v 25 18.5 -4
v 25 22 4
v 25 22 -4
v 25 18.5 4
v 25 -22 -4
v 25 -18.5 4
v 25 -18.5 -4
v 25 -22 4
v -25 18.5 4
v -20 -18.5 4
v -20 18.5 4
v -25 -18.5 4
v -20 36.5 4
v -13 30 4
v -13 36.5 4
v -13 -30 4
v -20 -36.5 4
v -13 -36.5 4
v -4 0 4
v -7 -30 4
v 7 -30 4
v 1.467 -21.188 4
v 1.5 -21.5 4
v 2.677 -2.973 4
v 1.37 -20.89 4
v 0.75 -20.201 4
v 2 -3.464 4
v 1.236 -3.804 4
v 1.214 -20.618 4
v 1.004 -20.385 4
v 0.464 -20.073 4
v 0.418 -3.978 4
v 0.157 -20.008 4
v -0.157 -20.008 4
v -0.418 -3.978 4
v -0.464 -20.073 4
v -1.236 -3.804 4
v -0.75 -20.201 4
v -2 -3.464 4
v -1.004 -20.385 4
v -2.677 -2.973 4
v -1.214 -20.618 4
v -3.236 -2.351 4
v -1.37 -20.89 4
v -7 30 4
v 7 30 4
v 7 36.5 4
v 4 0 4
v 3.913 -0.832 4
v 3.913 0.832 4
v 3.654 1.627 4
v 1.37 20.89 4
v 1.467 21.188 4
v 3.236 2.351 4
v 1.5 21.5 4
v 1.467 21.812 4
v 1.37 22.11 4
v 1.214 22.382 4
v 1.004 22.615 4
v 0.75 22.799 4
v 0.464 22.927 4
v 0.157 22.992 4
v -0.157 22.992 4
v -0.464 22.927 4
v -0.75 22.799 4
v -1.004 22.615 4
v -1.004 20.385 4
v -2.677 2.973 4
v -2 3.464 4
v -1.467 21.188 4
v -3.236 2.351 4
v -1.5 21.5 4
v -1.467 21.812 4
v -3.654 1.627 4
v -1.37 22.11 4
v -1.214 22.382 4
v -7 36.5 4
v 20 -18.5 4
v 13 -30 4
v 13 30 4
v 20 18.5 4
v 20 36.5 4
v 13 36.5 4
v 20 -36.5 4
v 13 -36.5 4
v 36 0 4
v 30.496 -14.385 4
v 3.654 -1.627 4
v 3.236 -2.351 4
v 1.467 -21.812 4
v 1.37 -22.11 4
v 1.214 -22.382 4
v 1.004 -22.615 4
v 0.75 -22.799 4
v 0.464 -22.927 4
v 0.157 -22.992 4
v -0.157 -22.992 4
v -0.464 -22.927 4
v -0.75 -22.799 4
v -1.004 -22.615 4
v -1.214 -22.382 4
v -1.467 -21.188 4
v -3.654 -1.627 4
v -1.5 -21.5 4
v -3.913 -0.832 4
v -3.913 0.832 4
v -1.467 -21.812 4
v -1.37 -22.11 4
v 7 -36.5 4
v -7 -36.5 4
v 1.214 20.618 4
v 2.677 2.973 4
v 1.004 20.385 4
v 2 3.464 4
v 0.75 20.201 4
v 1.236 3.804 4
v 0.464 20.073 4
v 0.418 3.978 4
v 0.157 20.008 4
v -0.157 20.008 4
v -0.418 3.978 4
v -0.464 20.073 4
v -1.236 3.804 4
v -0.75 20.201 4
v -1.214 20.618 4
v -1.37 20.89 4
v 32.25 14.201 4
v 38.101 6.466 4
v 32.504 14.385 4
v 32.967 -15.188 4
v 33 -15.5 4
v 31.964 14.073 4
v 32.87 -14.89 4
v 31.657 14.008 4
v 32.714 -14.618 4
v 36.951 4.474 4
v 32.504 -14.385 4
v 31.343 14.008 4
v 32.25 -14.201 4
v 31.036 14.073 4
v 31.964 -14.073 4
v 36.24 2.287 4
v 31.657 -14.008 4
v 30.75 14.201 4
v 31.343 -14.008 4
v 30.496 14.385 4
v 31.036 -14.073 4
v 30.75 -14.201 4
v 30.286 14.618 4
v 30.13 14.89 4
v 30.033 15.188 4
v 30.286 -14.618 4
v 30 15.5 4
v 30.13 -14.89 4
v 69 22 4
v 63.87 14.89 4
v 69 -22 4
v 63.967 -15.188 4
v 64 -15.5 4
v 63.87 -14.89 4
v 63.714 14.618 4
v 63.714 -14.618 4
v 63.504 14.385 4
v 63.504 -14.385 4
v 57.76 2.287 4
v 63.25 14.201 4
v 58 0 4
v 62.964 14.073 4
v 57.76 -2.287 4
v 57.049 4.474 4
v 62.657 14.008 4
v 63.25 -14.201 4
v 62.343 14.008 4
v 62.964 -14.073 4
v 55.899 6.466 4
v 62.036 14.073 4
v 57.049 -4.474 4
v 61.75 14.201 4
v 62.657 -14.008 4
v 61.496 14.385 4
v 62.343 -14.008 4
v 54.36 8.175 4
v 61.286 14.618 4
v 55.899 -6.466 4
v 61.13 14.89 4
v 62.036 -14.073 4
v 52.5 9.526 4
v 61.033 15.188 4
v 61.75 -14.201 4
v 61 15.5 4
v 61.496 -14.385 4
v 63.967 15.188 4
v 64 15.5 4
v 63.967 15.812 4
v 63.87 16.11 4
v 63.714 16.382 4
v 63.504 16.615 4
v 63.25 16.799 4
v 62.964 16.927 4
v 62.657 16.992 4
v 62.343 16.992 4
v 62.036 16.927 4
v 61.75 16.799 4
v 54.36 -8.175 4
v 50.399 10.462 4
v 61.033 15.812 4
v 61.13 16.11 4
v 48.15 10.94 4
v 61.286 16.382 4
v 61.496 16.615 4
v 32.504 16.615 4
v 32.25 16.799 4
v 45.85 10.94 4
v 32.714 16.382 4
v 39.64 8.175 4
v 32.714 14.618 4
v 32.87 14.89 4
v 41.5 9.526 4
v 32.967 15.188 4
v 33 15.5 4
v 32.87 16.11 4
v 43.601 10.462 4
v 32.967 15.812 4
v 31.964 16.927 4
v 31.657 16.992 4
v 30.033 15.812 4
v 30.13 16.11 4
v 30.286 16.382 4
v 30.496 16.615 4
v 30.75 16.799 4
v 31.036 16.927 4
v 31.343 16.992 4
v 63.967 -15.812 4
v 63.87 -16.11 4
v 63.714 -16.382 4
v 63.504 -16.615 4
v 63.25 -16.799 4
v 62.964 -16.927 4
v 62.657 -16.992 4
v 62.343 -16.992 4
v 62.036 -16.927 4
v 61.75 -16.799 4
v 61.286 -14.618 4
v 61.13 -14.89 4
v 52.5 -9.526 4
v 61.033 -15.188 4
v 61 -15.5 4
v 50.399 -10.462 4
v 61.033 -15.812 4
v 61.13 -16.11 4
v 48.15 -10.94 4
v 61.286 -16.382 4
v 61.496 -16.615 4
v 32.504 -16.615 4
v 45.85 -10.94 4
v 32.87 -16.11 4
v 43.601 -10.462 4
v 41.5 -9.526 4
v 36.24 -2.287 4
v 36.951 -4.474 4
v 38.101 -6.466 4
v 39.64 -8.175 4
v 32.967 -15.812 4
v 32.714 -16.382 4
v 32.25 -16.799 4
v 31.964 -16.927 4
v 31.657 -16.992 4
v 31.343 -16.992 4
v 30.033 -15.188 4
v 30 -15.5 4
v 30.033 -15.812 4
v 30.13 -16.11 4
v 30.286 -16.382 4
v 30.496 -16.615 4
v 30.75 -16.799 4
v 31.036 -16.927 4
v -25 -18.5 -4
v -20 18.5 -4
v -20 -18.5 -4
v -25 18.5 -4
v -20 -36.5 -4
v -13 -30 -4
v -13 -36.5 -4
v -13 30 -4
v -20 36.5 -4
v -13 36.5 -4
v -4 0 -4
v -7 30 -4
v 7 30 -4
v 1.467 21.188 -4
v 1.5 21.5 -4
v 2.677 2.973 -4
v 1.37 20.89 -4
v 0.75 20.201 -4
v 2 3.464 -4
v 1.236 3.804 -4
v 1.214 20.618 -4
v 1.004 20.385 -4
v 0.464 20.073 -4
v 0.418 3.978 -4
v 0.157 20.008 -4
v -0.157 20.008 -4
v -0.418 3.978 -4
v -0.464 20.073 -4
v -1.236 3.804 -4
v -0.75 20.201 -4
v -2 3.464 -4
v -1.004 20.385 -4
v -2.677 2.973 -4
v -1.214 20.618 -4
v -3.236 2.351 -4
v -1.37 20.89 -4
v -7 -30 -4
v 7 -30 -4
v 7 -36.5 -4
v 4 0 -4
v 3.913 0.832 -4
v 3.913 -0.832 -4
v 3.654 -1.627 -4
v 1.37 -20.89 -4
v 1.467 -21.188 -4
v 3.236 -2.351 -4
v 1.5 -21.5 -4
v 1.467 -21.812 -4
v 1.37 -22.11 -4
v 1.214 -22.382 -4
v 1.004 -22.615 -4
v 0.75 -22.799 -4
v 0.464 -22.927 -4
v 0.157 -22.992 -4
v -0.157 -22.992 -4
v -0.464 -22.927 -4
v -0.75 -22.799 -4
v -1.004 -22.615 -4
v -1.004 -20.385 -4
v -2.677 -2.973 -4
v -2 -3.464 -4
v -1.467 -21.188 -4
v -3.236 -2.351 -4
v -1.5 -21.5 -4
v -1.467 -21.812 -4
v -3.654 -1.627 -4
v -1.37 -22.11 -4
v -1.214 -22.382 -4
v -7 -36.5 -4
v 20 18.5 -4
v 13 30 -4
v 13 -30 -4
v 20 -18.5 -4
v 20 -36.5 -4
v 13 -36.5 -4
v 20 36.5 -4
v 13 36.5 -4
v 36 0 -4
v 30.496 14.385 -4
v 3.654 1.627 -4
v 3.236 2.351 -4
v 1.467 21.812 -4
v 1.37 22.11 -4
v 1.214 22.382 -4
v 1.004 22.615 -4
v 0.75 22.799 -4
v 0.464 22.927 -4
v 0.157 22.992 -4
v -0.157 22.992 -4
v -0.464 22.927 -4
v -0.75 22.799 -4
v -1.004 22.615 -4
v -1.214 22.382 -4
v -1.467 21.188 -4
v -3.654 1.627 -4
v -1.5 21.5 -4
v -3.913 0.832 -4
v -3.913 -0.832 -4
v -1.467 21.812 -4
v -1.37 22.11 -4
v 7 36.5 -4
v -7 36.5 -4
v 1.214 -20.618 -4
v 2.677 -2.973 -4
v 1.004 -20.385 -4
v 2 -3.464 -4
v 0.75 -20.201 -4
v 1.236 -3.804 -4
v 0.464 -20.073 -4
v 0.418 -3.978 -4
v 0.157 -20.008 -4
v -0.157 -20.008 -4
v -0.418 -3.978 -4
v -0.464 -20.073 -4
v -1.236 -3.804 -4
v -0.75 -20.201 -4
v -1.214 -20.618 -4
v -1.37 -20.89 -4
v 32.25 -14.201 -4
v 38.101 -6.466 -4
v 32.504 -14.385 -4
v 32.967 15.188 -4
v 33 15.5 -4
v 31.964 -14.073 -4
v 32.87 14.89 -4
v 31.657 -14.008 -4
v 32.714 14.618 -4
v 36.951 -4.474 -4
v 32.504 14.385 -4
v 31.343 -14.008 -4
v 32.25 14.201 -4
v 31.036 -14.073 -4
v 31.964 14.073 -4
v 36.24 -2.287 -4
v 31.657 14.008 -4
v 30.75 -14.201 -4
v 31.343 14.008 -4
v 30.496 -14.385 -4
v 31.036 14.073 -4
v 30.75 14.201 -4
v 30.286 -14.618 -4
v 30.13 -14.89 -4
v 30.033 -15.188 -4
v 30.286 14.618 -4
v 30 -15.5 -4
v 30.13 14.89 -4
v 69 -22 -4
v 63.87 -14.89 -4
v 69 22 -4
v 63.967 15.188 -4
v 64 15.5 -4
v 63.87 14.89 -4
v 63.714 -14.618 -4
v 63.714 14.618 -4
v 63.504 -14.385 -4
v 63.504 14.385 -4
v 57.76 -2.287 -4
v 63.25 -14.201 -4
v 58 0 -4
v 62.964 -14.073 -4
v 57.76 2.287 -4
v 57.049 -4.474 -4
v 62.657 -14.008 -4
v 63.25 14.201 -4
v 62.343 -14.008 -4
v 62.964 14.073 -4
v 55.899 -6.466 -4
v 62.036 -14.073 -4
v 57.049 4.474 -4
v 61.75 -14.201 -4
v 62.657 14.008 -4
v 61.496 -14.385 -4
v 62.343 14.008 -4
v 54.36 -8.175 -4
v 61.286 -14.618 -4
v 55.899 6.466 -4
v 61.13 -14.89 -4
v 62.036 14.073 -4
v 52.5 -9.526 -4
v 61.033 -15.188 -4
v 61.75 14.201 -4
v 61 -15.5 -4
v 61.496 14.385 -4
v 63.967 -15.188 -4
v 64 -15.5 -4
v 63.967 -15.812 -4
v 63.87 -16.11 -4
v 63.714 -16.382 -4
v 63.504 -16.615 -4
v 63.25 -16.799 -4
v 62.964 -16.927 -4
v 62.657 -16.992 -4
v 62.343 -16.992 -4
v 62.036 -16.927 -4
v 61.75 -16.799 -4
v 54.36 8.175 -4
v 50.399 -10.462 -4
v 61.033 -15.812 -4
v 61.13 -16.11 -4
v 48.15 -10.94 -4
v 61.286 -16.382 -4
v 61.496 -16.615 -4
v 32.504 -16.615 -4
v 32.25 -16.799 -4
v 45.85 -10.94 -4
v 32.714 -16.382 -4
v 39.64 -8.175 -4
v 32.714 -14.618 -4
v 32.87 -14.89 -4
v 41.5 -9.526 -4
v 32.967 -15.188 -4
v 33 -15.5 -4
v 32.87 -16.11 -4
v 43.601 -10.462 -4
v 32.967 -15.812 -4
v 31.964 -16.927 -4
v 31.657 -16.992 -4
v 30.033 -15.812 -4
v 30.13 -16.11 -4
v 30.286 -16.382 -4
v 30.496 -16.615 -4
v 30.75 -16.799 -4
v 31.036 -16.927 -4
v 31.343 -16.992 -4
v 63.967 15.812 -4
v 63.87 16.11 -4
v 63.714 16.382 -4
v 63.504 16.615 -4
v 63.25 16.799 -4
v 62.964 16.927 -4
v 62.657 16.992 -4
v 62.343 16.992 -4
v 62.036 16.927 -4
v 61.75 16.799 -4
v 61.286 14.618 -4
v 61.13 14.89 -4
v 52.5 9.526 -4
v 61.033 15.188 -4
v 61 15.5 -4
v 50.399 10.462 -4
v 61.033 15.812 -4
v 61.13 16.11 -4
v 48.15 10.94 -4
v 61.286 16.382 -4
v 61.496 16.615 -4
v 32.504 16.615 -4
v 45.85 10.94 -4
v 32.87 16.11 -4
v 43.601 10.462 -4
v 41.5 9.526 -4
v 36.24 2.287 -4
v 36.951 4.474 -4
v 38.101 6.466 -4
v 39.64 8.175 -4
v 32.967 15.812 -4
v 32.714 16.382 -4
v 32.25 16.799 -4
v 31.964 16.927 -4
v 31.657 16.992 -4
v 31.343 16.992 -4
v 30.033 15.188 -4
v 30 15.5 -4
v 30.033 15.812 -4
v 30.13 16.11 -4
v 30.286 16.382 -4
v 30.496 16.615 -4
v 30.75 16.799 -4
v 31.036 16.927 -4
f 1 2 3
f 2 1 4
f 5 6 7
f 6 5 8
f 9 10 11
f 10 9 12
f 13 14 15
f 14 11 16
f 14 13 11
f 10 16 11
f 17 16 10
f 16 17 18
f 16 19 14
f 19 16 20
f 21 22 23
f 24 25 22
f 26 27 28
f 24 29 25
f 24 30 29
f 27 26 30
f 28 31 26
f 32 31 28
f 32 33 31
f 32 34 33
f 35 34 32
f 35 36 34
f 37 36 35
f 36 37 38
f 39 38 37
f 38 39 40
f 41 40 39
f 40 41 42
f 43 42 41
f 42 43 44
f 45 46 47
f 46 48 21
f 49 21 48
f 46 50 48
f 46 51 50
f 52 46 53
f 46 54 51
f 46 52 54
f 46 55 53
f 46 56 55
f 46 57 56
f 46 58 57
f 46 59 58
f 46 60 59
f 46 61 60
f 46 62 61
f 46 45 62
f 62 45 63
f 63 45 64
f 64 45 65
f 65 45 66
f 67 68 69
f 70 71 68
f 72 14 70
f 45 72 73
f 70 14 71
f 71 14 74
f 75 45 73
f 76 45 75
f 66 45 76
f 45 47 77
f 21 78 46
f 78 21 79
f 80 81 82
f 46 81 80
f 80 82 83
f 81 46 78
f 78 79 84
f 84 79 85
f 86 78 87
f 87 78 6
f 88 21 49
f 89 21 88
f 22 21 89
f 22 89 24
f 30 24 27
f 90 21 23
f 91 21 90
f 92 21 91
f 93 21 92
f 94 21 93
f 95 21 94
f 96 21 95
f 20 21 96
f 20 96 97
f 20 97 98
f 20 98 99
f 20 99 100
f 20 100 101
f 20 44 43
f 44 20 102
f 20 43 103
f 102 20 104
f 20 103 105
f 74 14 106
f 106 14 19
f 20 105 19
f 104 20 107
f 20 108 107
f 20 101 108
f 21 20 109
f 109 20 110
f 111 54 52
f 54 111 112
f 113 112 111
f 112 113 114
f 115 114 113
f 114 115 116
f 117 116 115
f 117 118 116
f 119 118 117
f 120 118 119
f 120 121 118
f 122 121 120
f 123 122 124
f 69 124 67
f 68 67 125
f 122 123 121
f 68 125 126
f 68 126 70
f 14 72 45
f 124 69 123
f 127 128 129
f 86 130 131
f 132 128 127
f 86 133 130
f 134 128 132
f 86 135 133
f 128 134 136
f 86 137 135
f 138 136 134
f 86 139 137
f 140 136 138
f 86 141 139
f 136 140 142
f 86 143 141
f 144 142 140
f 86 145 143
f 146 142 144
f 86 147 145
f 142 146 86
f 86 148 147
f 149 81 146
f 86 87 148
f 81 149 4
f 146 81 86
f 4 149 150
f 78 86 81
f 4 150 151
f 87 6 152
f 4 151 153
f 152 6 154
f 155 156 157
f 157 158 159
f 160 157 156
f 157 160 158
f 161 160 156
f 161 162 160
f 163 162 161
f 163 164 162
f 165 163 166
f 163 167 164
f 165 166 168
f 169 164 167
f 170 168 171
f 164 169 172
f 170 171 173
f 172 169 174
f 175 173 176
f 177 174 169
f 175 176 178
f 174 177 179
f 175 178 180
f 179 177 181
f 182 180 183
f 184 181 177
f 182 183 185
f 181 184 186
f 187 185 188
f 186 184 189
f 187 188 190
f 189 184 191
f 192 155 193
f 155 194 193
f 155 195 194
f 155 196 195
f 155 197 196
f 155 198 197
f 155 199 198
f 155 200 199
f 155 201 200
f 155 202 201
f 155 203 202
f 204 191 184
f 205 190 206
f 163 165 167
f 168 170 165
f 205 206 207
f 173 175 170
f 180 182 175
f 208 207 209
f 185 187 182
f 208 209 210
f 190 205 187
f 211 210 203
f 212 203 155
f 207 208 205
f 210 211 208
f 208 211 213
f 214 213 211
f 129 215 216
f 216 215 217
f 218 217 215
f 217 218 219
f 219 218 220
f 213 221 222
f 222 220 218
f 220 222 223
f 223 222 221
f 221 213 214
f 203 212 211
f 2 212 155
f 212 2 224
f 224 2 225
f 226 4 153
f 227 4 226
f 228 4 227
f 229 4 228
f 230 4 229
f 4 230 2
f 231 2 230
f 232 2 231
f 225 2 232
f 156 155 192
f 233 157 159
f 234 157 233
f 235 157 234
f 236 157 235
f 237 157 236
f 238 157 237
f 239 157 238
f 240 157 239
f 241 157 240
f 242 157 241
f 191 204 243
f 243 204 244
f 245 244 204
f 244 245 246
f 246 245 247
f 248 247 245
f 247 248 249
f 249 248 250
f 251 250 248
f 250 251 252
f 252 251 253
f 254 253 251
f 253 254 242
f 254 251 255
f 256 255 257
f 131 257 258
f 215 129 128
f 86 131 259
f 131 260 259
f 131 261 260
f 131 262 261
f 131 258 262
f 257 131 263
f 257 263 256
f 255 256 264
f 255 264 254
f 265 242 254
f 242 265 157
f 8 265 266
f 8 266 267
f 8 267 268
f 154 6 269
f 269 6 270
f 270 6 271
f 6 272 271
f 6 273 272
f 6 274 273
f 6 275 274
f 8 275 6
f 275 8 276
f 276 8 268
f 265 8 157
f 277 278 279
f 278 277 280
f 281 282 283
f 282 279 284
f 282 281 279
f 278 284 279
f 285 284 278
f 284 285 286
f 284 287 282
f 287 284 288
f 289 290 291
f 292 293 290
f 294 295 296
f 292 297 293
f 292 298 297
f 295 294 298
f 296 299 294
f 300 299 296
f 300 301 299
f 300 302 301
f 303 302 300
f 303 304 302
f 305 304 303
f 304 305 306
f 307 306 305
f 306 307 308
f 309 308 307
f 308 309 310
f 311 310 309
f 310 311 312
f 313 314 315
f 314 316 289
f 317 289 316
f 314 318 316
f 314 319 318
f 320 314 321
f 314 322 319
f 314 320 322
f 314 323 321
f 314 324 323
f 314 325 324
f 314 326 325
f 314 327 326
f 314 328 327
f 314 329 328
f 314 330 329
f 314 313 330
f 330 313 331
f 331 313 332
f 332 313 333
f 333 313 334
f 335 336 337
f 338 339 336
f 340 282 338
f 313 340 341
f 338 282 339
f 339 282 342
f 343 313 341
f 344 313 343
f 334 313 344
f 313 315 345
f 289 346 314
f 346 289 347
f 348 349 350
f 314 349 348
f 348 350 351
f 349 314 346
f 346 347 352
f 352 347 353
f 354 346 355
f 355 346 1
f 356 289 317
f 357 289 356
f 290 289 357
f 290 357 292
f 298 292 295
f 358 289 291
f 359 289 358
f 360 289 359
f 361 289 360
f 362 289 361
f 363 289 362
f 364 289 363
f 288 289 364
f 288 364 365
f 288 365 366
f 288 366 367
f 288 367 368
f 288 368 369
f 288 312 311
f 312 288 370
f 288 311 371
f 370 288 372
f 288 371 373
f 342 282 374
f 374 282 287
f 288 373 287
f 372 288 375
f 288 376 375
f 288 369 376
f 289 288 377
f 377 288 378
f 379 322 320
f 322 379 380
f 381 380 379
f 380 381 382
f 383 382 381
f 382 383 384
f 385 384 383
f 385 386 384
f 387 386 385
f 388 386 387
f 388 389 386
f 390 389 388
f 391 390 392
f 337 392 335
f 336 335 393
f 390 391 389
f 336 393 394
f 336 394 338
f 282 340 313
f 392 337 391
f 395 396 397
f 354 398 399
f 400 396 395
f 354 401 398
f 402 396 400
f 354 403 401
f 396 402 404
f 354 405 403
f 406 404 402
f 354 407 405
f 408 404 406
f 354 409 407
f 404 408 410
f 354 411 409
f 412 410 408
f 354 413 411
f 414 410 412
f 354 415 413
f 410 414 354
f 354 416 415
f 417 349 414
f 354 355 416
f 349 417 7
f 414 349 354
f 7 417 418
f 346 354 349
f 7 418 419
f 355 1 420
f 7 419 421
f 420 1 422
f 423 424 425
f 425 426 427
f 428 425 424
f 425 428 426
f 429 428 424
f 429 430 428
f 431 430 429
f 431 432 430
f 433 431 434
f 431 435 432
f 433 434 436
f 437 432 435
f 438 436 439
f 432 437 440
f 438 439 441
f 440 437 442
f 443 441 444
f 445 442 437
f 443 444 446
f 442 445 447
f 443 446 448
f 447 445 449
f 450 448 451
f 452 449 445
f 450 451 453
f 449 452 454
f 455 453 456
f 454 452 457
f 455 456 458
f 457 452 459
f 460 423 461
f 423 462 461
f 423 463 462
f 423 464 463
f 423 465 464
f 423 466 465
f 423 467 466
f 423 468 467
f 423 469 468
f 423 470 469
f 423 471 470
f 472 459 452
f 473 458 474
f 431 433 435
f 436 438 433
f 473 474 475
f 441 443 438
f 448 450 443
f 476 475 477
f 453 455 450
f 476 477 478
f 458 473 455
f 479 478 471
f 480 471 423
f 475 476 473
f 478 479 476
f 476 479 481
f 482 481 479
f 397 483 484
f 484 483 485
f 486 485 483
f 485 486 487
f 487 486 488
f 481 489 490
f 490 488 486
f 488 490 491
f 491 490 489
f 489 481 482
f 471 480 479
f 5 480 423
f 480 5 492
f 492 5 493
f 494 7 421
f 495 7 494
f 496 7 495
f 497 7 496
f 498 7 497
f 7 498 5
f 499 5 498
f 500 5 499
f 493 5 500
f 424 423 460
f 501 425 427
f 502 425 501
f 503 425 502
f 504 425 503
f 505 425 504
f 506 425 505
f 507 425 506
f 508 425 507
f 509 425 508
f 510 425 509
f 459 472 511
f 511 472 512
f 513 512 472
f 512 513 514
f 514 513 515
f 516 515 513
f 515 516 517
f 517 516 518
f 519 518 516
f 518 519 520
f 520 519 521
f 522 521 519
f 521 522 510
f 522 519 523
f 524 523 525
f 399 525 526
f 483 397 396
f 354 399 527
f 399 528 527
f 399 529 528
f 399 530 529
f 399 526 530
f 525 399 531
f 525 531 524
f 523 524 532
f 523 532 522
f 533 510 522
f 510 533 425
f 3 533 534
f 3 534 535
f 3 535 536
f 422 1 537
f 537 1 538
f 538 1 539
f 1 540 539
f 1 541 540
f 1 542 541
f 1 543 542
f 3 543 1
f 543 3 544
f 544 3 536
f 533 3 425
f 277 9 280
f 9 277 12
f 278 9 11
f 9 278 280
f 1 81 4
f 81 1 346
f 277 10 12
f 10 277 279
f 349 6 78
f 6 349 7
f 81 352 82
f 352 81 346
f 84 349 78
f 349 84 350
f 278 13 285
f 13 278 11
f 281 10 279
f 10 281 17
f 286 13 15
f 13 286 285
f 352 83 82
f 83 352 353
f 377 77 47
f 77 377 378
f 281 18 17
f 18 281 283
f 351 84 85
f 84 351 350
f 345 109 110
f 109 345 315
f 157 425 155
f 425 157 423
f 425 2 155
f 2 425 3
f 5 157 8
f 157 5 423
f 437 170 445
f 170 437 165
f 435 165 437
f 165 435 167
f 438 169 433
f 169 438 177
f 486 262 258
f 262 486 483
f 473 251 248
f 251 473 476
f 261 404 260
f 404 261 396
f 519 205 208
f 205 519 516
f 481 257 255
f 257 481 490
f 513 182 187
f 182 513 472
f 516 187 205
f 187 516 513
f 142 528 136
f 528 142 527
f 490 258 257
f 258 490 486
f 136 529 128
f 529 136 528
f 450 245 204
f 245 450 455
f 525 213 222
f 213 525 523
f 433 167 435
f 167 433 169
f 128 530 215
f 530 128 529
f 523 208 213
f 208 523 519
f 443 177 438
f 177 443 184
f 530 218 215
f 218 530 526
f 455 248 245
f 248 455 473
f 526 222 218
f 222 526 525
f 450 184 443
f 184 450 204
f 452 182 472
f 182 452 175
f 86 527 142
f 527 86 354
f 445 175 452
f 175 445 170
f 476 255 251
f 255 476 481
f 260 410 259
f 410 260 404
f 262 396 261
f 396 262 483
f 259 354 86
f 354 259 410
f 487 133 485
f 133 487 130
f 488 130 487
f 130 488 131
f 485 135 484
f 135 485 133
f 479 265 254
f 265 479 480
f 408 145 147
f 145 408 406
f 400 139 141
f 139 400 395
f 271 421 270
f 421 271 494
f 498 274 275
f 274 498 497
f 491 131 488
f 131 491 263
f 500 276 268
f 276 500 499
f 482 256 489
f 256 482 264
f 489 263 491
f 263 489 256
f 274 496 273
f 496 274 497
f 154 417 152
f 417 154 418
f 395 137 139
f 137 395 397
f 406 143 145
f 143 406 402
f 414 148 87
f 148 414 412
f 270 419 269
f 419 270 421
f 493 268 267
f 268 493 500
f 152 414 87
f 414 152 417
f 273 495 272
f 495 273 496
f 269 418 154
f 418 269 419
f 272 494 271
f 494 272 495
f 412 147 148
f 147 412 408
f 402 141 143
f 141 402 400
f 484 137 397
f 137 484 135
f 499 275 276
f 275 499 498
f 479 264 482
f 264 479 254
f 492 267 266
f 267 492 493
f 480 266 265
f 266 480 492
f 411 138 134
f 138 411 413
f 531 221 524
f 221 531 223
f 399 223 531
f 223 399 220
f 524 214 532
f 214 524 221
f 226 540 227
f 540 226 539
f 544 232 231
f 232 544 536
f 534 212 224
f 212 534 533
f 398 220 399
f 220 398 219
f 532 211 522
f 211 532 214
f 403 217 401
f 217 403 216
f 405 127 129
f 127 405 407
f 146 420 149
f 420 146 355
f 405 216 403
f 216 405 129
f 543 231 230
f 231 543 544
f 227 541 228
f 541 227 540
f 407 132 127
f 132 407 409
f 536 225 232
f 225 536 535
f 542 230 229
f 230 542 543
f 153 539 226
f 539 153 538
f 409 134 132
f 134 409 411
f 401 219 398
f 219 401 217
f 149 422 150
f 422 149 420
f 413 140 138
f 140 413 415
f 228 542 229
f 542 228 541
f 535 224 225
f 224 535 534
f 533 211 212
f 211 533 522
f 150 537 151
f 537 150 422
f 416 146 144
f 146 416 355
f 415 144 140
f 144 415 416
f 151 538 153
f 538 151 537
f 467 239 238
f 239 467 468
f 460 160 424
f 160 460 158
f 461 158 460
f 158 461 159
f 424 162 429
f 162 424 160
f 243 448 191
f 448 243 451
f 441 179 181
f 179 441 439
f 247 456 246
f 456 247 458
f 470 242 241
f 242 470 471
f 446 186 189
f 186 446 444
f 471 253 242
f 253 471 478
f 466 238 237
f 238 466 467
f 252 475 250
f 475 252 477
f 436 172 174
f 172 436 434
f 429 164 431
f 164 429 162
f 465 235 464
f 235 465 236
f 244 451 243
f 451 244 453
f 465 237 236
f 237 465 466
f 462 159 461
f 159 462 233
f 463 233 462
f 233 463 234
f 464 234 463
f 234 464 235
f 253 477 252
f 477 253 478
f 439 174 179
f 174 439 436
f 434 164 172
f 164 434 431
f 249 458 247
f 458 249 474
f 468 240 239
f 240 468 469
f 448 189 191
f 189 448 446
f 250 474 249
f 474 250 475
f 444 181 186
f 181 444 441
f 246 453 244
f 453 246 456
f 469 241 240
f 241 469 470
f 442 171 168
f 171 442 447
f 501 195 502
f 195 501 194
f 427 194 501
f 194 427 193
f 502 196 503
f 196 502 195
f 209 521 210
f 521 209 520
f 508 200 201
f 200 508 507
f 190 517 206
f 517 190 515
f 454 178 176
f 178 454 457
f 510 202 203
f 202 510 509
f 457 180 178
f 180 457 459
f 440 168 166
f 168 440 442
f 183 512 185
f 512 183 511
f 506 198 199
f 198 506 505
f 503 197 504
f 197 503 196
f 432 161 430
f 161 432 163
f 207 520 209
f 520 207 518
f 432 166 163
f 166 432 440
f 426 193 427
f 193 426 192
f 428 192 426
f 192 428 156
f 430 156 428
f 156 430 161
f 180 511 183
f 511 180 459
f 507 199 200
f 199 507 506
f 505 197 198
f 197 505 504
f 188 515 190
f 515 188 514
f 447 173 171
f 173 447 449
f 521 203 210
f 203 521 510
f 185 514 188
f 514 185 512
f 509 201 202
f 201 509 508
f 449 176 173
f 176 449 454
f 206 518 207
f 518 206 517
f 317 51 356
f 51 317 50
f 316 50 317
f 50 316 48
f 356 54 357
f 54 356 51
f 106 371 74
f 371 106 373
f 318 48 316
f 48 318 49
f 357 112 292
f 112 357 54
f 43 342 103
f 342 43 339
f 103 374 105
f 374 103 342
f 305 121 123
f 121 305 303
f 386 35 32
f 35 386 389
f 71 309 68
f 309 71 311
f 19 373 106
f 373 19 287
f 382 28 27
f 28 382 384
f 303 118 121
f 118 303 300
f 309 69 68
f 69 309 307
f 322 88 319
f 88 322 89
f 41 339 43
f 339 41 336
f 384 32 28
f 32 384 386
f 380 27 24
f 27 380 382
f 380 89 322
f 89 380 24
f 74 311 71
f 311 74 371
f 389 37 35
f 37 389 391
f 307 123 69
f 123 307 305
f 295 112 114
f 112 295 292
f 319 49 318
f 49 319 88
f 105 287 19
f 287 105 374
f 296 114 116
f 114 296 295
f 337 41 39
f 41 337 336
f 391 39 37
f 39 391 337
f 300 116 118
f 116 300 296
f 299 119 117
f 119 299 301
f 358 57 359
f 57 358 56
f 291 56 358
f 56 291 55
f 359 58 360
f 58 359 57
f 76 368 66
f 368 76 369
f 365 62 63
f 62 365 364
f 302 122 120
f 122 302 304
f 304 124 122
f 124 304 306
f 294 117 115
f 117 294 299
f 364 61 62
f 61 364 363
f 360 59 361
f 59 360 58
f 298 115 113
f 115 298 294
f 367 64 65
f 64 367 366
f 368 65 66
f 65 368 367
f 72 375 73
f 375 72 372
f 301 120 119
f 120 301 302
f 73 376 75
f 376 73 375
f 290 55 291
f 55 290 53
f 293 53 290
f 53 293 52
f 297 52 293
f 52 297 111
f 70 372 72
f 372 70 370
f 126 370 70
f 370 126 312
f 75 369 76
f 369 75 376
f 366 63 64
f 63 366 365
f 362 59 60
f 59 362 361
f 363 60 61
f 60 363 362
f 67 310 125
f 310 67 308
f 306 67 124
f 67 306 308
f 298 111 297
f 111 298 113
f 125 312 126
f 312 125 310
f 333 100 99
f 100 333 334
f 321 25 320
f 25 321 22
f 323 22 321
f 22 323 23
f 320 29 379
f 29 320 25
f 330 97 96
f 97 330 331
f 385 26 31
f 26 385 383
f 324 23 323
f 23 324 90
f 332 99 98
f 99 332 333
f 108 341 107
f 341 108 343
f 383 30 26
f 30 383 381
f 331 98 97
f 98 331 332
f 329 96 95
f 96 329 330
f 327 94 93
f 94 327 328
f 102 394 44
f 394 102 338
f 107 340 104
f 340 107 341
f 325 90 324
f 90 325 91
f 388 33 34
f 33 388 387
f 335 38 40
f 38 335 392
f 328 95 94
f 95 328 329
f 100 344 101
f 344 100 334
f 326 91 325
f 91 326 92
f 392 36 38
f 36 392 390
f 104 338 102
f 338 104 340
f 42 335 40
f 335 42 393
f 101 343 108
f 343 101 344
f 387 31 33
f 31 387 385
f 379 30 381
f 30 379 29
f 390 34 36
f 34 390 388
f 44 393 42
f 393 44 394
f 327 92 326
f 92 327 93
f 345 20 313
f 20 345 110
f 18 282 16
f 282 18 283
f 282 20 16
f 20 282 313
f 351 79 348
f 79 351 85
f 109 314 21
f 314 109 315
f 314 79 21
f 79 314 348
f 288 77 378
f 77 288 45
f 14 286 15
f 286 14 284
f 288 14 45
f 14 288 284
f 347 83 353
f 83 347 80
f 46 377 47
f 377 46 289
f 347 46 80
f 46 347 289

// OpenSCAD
$fn=30;
DELTA=0.1;
difference() {
union() {
    cube([50,37,8],true);
    cube([40,73,8],true);
    translate([25+22,0,0])cube([44,44,8],true);
}
    translate([-10,-33.25-DELTA/2,0])cube([6,6.5+DELTA,8+DELTA],true);
    translate([10,-33.25-DELTA/2,0])cube([6,6.5+DELTA,8+DELTA],true);
    translate([-10,33.25+DELTA/2,0])cube([6,6.5+DELTA,8+DELTA],true);
    translate([10,33.25+DELTA/2,0])cube([6,6.5+DELTA,8+DELTA],true);
    translate([0,0,-4-DELTA]){
        cylinder(r=4,h=8+DELTA*2);
        translate([0,73/2-15,0])cylinder(r=1.5,h=8+DELTA*2);
        translate([0,-(73/2-15),0])cylinder(r=1.5,h=8+DELTA*2);
        translate([25+22,0,0]){
            cylinder(r=11,h=8+DELTA*2);
            translate([-31/2,-31/2,0])cylinder(r=1.5,h=8+DELTA*2);
            translate([-31/2,31/2,0])cylinder(r=1.5,h=8+DELTA*2);
            translate([31/2,-31/2,0])cylinder(r=1.5,h=8+DELTA*2);
            translate([31/2,31/2,0])cylinder(r=1.5,h=8+DELTA*2);
        }
    }
}
